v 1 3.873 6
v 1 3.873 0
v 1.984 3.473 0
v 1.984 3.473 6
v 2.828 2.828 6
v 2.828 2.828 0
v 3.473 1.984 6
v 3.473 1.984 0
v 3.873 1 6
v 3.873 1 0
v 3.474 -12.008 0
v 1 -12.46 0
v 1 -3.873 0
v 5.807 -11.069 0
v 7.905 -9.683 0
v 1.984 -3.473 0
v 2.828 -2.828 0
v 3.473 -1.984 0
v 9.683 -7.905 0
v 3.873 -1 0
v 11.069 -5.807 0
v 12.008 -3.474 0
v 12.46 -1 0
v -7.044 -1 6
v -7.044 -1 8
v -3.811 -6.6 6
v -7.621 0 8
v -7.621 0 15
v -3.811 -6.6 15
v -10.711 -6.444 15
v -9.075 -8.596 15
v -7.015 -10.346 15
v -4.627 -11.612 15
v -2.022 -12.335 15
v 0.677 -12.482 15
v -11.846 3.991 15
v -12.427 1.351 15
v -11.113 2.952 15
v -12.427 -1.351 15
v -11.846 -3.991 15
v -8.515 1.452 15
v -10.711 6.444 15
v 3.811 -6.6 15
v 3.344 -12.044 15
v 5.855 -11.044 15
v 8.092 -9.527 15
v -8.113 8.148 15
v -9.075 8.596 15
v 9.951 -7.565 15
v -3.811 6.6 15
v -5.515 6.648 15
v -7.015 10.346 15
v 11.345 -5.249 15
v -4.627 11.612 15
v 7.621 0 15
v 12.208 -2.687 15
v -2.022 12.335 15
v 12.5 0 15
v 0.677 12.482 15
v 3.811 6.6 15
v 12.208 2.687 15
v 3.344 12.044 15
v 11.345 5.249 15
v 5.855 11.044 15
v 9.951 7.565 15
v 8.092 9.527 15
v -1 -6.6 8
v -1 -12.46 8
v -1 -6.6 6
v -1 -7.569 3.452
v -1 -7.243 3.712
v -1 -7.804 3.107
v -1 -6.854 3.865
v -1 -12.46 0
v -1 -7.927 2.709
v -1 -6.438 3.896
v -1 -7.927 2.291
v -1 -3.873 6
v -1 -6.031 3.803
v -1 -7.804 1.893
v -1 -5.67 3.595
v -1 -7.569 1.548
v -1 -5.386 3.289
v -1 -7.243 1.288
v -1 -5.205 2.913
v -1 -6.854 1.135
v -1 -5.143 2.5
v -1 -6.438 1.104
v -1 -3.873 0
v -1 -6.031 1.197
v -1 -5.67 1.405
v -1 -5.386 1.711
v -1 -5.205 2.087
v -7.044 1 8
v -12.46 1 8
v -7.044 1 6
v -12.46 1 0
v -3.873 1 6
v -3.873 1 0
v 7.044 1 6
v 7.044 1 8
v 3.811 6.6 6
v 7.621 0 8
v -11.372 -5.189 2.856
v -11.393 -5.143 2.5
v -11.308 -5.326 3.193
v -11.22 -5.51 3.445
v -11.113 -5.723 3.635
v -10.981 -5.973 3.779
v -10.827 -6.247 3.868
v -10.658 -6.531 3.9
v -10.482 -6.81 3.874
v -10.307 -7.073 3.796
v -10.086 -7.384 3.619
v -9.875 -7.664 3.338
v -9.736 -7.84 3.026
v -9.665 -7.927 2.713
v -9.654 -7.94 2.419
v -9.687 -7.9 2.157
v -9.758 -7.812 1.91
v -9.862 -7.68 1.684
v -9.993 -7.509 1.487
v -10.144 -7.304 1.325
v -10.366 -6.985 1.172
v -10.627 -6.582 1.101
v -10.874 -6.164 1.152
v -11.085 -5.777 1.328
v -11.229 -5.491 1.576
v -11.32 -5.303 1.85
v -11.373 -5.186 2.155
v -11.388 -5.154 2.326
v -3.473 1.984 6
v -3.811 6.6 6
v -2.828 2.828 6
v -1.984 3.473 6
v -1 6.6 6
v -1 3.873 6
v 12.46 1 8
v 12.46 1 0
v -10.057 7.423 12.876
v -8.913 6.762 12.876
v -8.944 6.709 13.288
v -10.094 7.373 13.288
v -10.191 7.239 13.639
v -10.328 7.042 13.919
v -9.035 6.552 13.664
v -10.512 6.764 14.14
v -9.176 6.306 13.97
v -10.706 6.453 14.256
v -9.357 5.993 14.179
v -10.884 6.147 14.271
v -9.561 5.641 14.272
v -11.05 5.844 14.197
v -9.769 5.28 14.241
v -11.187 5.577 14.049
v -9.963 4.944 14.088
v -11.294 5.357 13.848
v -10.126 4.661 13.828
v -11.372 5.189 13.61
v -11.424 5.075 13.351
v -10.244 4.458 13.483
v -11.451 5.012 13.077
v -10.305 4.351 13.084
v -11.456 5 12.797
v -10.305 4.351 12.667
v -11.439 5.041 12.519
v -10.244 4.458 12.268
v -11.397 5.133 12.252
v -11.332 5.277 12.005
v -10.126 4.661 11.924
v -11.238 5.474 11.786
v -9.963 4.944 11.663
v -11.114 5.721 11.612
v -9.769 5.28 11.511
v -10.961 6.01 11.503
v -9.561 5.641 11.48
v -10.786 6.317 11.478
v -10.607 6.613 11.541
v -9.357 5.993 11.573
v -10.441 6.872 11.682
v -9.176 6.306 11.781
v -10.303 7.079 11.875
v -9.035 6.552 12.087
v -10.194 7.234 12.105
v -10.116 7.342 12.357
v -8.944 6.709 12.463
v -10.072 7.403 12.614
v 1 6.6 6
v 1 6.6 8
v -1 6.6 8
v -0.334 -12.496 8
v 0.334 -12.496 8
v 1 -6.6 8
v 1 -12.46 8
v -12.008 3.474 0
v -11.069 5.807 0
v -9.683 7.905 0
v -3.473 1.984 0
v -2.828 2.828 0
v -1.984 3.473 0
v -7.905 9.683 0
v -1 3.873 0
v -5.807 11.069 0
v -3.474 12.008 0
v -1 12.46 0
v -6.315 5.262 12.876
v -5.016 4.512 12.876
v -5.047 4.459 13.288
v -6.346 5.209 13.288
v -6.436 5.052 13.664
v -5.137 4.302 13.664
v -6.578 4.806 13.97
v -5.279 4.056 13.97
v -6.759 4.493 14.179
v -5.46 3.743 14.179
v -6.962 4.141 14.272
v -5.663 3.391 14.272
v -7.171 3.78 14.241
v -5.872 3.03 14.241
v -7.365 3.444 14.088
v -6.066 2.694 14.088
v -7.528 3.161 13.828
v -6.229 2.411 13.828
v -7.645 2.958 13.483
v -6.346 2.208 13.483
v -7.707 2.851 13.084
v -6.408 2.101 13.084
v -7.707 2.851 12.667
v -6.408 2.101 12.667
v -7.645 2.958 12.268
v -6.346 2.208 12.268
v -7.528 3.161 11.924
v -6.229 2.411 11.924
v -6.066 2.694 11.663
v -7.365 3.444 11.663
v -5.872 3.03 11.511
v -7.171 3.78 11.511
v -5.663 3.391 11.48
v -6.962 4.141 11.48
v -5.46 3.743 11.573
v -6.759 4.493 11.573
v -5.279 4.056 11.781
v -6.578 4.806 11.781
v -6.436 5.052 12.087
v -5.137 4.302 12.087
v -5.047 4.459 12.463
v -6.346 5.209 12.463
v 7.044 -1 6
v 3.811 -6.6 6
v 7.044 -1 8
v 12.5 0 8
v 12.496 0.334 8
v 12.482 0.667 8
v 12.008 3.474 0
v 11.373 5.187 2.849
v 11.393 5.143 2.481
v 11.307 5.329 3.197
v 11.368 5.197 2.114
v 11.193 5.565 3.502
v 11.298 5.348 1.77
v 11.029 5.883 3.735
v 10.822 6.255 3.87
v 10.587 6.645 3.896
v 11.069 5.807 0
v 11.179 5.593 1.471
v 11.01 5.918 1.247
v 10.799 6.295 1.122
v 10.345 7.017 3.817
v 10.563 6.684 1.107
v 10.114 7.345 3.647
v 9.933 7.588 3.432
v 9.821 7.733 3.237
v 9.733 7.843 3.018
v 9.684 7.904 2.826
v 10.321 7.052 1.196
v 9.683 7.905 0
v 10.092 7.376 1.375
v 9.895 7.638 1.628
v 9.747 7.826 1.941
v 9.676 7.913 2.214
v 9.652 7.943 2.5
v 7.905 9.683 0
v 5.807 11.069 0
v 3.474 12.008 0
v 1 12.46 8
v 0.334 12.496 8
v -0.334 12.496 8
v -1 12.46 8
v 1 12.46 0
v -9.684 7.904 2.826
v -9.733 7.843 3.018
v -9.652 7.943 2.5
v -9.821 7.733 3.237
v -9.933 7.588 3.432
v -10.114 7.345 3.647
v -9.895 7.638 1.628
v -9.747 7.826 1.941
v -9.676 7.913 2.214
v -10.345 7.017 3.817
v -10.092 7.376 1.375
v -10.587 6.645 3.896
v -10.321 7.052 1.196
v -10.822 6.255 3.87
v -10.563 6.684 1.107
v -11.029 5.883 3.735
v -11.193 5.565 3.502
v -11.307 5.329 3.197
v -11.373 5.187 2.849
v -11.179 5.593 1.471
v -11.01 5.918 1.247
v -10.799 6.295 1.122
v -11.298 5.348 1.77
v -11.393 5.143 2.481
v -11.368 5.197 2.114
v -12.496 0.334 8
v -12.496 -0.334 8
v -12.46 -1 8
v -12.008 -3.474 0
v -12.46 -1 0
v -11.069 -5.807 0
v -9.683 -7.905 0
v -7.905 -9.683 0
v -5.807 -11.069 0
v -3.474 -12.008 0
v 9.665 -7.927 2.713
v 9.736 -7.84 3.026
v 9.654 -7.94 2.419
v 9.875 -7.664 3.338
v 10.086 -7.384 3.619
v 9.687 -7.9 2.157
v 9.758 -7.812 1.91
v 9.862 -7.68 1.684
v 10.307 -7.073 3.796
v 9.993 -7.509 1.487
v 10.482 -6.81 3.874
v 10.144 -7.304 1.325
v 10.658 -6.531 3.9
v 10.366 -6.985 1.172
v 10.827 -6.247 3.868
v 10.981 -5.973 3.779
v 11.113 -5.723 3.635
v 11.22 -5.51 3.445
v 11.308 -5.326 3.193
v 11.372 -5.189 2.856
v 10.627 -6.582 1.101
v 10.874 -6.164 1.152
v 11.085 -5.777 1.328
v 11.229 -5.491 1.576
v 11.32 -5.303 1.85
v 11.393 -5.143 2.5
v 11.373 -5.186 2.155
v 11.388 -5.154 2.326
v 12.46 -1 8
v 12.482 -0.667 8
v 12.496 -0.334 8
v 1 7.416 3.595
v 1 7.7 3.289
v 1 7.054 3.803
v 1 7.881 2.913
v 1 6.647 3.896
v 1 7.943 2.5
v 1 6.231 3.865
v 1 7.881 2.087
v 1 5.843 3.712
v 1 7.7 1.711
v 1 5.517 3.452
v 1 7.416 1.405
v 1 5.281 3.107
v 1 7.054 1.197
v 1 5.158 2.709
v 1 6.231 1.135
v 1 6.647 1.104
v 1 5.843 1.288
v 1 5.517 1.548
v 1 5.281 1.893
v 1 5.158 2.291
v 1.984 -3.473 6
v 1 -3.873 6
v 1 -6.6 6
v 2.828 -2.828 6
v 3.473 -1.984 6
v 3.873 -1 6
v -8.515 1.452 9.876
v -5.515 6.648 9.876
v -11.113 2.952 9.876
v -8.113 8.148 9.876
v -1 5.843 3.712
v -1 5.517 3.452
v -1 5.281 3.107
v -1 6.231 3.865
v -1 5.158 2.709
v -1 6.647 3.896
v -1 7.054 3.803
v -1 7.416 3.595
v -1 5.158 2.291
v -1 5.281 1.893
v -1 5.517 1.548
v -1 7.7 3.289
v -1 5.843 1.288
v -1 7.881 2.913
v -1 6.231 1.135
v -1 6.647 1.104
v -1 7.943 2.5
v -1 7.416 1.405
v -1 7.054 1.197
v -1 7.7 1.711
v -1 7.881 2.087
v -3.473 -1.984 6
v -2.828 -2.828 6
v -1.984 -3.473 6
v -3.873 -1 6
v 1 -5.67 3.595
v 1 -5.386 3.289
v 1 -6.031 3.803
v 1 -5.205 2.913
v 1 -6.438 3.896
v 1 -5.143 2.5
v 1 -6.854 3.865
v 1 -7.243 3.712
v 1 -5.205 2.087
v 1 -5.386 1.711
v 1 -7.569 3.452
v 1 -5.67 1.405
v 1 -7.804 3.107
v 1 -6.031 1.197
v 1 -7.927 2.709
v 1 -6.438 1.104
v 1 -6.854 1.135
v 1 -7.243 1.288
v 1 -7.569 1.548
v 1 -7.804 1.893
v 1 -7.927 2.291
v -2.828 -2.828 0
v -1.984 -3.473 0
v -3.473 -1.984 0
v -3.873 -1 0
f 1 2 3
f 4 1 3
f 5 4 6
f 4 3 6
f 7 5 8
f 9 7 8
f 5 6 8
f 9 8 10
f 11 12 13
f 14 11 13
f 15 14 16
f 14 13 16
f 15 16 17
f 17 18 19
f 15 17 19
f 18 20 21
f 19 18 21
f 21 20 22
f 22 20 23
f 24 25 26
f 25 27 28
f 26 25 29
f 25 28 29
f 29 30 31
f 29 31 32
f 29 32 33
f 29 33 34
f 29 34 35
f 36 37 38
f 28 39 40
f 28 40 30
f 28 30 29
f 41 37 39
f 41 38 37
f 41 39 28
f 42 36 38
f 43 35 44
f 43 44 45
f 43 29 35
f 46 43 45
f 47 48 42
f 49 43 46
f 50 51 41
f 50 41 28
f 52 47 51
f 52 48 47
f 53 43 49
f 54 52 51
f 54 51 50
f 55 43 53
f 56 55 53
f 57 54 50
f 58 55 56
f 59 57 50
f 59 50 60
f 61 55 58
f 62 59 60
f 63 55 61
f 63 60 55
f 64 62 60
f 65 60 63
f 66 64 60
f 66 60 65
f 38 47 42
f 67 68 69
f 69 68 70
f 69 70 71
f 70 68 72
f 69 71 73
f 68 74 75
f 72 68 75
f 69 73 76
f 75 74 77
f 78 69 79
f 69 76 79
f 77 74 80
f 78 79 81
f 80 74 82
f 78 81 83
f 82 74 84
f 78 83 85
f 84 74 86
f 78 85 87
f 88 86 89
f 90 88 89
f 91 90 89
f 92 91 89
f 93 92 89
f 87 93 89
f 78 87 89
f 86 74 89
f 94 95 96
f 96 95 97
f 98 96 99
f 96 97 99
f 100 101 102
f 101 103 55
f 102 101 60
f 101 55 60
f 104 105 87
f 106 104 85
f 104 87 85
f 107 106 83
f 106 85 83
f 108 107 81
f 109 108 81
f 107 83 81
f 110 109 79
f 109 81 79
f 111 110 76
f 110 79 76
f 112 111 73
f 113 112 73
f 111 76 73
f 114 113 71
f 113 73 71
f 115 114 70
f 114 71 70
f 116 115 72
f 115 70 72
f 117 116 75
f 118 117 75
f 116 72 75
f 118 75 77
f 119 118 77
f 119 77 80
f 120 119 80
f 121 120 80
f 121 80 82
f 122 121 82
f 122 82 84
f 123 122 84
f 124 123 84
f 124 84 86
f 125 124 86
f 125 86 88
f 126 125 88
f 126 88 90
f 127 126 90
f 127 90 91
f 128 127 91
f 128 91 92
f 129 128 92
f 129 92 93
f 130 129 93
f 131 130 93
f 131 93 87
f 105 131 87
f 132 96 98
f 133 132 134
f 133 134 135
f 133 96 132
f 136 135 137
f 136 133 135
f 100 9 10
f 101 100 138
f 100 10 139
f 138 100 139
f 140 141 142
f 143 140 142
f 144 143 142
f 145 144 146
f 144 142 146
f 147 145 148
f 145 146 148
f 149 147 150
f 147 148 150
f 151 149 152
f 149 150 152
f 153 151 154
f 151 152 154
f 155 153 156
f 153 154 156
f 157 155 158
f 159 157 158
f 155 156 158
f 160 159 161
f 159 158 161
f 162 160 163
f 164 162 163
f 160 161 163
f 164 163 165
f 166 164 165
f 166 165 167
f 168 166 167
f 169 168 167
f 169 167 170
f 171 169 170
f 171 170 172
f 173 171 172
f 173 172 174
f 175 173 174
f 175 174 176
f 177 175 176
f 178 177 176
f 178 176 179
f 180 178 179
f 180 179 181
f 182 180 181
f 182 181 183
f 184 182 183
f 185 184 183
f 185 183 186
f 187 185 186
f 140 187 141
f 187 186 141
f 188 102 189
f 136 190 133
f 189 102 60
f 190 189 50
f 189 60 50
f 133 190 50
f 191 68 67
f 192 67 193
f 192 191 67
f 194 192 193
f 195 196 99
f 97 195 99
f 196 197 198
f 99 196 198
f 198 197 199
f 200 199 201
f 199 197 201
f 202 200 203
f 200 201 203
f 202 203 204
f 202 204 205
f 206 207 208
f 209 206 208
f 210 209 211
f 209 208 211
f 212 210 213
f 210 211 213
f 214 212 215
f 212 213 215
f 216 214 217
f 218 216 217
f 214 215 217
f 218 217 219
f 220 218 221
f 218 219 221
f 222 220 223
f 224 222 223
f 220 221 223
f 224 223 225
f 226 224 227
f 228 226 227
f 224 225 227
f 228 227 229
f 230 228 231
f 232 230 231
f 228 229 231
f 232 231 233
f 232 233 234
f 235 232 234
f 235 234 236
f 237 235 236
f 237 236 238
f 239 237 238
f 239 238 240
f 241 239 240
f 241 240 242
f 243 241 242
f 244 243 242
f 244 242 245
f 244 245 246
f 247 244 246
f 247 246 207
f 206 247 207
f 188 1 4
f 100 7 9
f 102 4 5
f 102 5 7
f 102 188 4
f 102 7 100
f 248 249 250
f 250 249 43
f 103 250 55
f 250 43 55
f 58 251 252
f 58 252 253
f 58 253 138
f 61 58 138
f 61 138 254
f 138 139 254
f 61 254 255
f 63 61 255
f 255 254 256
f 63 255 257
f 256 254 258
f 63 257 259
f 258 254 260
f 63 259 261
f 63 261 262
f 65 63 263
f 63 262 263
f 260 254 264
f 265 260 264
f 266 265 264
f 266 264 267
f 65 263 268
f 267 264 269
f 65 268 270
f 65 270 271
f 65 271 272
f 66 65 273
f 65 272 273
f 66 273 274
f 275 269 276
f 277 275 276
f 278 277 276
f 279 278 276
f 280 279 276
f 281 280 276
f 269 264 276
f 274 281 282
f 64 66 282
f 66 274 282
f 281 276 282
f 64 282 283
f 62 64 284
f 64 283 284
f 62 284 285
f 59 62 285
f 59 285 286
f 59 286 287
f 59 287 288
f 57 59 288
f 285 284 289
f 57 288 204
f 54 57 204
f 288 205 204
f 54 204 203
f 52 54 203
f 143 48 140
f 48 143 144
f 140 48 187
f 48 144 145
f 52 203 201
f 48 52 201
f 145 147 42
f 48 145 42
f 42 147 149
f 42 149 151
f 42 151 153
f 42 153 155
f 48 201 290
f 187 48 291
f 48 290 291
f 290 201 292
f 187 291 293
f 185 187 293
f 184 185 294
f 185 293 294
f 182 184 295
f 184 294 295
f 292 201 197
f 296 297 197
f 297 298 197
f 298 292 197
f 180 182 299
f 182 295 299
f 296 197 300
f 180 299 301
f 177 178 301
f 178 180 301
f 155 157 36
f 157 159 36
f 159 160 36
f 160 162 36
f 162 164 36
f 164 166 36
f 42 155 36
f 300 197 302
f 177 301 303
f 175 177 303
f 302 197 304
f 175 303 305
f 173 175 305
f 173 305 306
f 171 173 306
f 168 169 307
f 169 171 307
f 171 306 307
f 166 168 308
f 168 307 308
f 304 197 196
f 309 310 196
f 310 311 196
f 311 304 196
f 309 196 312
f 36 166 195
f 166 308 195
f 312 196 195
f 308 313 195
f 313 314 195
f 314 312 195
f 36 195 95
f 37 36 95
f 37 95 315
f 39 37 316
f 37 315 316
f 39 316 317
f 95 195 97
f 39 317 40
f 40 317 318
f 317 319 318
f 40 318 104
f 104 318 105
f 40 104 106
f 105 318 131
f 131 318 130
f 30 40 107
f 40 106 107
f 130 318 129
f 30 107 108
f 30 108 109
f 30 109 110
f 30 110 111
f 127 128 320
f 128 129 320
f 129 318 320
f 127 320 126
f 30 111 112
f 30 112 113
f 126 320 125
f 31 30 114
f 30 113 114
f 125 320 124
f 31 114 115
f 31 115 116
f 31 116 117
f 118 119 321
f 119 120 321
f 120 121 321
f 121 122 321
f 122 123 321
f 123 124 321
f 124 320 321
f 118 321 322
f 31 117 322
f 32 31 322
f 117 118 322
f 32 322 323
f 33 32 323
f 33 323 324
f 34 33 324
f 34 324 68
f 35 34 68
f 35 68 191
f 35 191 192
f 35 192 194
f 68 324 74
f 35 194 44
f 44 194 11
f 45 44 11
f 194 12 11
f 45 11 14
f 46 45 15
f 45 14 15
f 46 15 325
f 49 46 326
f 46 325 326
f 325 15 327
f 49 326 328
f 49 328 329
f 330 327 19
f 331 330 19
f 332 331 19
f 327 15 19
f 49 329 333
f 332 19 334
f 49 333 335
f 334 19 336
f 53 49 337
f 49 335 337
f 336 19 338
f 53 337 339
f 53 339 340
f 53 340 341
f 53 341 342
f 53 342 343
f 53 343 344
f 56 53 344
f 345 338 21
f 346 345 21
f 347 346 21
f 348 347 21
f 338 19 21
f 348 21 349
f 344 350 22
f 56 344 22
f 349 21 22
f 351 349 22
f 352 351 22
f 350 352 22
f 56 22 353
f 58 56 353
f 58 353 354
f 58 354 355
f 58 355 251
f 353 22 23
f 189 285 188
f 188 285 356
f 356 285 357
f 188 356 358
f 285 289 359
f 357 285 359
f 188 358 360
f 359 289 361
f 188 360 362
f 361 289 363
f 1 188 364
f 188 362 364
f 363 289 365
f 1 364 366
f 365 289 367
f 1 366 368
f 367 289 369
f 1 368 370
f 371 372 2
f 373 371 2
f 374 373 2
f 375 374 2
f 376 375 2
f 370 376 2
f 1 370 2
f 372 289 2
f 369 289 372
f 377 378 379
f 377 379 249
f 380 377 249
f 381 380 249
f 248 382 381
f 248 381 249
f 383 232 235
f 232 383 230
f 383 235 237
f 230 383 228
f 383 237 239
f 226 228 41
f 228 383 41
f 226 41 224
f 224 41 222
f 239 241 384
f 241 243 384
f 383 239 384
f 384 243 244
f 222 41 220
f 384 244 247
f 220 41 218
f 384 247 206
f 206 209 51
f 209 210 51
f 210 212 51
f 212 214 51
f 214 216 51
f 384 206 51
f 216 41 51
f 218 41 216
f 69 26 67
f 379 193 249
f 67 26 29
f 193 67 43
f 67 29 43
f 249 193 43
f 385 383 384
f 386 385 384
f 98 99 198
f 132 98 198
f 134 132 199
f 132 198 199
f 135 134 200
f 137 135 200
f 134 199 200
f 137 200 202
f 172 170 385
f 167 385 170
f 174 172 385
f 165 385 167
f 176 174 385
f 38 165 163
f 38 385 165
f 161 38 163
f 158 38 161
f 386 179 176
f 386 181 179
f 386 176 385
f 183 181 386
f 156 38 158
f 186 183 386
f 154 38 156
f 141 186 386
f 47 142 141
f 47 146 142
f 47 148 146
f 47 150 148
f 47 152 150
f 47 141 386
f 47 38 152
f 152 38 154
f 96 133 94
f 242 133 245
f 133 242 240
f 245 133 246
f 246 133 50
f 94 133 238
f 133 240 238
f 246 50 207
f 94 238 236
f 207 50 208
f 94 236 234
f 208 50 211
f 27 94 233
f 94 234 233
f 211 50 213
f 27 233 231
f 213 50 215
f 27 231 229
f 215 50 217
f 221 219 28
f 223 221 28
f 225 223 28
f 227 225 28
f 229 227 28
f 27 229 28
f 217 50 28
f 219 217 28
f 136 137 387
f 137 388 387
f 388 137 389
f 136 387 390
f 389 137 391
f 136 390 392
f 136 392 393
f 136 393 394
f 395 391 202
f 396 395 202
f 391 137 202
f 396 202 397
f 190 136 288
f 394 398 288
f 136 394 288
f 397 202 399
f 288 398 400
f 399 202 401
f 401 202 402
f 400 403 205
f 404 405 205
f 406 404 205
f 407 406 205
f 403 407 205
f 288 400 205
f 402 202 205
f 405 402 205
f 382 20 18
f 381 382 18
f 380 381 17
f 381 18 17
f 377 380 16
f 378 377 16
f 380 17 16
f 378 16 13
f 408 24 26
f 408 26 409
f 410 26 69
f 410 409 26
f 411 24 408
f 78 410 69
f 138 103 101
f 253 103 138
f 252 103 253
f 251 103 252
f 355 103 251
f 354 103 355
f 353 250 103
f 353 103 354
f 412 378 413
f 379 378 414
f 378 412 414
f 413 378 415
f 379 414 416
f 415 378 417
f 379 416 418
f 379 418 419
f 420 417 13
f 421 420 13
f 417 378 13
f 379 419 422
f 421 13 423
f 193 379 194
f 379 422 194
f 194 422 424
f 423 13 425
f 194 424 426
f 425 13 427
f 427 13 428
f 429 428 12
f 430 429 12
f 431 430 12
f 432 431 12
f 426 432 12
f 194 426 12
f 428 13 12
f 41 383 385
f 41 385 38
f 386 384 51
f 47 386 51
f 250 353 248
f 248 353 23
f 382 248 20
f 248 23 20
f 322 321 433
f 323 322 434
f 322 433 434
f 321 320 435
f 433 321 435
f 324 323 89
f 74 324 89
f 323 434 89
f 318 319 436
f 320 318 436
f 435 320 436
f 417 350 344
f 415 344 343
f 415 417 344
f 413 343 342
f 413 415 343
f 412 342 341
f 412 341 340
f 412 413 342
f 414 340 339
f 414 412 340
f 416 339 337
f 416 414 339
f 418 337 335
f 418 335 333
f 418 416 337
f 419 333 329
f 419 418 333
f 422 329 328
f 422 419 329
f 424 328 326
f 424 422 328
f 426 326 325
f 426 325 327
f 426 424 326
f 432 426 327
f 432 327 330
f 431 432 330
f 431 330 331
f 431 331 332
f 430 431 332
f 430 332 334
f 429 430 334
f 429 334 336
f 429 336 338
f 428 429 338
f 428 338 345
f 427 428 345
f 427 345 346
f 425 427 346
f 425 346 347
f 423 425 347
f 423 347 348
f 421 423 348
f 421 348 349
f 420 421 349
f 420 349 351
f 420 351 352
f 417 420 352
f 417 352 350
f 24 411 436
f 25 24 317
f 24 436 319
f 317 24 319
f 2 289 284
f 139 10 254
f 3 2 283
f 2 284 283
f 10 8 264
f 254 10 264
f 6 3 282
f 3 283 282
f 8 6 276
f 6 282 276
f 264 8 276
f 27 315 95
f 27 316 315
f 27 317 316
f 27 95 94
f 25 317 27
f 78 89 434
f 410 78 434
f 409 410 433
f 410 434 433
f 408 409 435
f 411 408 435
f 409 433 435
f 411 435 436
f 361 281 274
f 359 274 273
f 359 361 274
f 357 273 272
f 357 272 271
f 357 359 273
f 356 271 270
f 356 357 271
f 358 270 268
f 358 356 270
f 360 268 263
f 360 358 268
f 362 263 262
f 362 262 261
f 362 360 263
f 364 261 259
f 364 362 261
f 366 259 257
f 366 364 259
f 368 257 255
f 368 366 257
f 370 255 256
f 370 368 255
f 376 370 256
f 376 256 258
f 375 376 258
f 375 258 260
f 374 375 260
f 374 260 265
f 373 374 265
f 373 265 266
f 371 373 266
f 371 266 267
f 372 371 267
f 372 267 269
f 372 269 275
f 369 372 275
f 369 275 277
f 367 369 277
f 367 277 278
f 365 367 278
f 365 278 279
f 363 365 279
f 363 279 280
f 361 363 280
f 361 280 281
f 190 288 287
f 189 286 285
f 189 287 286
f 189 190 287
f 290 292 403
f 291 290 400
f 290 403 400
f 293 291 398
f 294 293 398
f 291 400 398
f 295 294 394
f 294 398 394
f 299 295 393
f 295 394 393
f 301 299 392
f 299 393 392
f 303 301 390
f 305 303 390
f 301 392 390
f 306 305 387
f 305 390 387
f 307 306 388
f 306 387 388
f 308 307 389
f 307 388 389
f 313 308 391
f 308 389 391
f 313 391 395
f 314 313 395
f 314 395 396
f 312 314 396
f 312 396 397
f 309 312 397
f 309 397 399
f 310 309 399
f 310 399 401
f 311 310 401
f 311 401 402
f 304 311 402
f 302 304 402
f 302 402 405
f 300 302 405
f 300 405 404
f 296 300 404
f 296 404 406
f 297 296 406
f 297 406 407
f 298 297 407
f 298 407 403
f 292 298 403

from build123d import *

# Parameters (mm, degrees)
F0_R           = 12.5
F1_DEPTH       = 15
F3_DEPTH       = 8
F5_DEPTH       = 9
F6_R           = 1.4
F7_DEPTH       = 5.9
F9_W           = 6
F9_H           = 6
F10_DEPTH      = 3
F11_R          = 1.4
F12_DEPTH      = 12.5010001
F12_DEPTH_BACK = 12.5010001


with BuildPart() as f1:
    # F0 (on Top) → F1 (new body)
    with BuildSketch(Plane.XY):
        Circle(F0_R)
    extrude(amount=F1_DEPTH)

    # F2 (on face) → F3 (cut)
    with BuildSketch(Plane(origin=(0, 0, 0), x_dir=(1, 0, 0), z_dir=(0, 0, -1))):
        with BuildLine():
            Line((-3.8729833462, 1), (-12.5, 1))
            Line((-12.5, 1), (-12.5, -1))
            Line((-12.5, -1), (-3.8729833462, -1))
            ThreePointArc((-3.8729833462, -1), (-2.8284271247, -2.8284271247), (-1, -3.8729833462))
            Line((-1, -3.8729833462), (-1, -12.5))
            Line((-1, -12.5), (1, -12.5))
            Line((1, -12.5), (1, -3.8729833462))
            ThreePointArc((1, -3.8729833462), (2.8284271247, -2.8284271247), (3.8729833462, -1))
            Line((3.8729833462, -1), (12.5, -1))
            Line((12.5, -1), (12.5, 1))
            Line((12.5, 1), (3.8729833462, 1))
            ThreePointArc((3.8729833462, 1), (2.8284271247, 2.8284271247), (1, 3.8729833462))
            Line((1, 3.8729833462), (1, 12.5))
            Line((1, 12.5), (-1, 12.5))
            Line((-1, 12.5), (-1, 3.8729833462))
            ThreePointArc((-1, 3.8729833462), (-2.8284271247, 2.8284271247), (-3.8729833462, 1))
        make_face()
    extrude(amount=-F3_DEPTH, mode=Mode.SUBTRACT)

    # F4 (on face) → F5 (cut)
    with BuildSketch(Plane.XY.offset(15)):
        Polygon((3.8105117767, 6.6), (-3.8105117767, 6.6), (-7.6210235533, 0), (-3.8105117767, -6.6), (3.8105117767, -6.6), (7.6210235533, 0), align=None)
    extrude(amount=-F5_DEPTH, mode=Mode.SUBTRACT)

    # F6 (on face) → F7 (cut, through all)
    with BuildSketch(Plane(origin=(-5.715767665, 3.3, 0), x_dir=(0.5, 0.8660254038, 0), z_dir=(0.8660254038, -0.5, 0))):
        with Locations((0, 12.8758029834)):
            Circle(F6_R)
    extrude(amount=-F7_DEPTH, mode=Mode.SUBTRACT)

    # F9 (on offset) → F10 (cut)
    with BuildSketch(Plane(origin=(-7.0148057707, 4.05, 0), x_dir=(0.5, 0.8660254038, 0), z_dir=(0.8660254038, -0.5, 0))):
        with Locations((0, 12.8758029834)):
            Rectangle(F9_W, F9_H)
    extrude(amount=-F10_DEPTH, mode=Mode.SUBTRACT)

    # F11 (on Right) → F12 (cut, two sides)
    with BuildSketch(Plane.YZ) as f12_sk:
        with Locations((6.542795848, 2.5)):
            Circle(F11_R)
        with Locations((-6.542795848, 2.5)):
            Circle(F11_R)
    extrude(amount=-F12_DEPTH, mode=Mode.SUBTRACT)
    extrude(f12_sk.sketch, amount=F12_DEPTH_BACK, mode=Mode.SUBTRACT)


solid = f1.part
